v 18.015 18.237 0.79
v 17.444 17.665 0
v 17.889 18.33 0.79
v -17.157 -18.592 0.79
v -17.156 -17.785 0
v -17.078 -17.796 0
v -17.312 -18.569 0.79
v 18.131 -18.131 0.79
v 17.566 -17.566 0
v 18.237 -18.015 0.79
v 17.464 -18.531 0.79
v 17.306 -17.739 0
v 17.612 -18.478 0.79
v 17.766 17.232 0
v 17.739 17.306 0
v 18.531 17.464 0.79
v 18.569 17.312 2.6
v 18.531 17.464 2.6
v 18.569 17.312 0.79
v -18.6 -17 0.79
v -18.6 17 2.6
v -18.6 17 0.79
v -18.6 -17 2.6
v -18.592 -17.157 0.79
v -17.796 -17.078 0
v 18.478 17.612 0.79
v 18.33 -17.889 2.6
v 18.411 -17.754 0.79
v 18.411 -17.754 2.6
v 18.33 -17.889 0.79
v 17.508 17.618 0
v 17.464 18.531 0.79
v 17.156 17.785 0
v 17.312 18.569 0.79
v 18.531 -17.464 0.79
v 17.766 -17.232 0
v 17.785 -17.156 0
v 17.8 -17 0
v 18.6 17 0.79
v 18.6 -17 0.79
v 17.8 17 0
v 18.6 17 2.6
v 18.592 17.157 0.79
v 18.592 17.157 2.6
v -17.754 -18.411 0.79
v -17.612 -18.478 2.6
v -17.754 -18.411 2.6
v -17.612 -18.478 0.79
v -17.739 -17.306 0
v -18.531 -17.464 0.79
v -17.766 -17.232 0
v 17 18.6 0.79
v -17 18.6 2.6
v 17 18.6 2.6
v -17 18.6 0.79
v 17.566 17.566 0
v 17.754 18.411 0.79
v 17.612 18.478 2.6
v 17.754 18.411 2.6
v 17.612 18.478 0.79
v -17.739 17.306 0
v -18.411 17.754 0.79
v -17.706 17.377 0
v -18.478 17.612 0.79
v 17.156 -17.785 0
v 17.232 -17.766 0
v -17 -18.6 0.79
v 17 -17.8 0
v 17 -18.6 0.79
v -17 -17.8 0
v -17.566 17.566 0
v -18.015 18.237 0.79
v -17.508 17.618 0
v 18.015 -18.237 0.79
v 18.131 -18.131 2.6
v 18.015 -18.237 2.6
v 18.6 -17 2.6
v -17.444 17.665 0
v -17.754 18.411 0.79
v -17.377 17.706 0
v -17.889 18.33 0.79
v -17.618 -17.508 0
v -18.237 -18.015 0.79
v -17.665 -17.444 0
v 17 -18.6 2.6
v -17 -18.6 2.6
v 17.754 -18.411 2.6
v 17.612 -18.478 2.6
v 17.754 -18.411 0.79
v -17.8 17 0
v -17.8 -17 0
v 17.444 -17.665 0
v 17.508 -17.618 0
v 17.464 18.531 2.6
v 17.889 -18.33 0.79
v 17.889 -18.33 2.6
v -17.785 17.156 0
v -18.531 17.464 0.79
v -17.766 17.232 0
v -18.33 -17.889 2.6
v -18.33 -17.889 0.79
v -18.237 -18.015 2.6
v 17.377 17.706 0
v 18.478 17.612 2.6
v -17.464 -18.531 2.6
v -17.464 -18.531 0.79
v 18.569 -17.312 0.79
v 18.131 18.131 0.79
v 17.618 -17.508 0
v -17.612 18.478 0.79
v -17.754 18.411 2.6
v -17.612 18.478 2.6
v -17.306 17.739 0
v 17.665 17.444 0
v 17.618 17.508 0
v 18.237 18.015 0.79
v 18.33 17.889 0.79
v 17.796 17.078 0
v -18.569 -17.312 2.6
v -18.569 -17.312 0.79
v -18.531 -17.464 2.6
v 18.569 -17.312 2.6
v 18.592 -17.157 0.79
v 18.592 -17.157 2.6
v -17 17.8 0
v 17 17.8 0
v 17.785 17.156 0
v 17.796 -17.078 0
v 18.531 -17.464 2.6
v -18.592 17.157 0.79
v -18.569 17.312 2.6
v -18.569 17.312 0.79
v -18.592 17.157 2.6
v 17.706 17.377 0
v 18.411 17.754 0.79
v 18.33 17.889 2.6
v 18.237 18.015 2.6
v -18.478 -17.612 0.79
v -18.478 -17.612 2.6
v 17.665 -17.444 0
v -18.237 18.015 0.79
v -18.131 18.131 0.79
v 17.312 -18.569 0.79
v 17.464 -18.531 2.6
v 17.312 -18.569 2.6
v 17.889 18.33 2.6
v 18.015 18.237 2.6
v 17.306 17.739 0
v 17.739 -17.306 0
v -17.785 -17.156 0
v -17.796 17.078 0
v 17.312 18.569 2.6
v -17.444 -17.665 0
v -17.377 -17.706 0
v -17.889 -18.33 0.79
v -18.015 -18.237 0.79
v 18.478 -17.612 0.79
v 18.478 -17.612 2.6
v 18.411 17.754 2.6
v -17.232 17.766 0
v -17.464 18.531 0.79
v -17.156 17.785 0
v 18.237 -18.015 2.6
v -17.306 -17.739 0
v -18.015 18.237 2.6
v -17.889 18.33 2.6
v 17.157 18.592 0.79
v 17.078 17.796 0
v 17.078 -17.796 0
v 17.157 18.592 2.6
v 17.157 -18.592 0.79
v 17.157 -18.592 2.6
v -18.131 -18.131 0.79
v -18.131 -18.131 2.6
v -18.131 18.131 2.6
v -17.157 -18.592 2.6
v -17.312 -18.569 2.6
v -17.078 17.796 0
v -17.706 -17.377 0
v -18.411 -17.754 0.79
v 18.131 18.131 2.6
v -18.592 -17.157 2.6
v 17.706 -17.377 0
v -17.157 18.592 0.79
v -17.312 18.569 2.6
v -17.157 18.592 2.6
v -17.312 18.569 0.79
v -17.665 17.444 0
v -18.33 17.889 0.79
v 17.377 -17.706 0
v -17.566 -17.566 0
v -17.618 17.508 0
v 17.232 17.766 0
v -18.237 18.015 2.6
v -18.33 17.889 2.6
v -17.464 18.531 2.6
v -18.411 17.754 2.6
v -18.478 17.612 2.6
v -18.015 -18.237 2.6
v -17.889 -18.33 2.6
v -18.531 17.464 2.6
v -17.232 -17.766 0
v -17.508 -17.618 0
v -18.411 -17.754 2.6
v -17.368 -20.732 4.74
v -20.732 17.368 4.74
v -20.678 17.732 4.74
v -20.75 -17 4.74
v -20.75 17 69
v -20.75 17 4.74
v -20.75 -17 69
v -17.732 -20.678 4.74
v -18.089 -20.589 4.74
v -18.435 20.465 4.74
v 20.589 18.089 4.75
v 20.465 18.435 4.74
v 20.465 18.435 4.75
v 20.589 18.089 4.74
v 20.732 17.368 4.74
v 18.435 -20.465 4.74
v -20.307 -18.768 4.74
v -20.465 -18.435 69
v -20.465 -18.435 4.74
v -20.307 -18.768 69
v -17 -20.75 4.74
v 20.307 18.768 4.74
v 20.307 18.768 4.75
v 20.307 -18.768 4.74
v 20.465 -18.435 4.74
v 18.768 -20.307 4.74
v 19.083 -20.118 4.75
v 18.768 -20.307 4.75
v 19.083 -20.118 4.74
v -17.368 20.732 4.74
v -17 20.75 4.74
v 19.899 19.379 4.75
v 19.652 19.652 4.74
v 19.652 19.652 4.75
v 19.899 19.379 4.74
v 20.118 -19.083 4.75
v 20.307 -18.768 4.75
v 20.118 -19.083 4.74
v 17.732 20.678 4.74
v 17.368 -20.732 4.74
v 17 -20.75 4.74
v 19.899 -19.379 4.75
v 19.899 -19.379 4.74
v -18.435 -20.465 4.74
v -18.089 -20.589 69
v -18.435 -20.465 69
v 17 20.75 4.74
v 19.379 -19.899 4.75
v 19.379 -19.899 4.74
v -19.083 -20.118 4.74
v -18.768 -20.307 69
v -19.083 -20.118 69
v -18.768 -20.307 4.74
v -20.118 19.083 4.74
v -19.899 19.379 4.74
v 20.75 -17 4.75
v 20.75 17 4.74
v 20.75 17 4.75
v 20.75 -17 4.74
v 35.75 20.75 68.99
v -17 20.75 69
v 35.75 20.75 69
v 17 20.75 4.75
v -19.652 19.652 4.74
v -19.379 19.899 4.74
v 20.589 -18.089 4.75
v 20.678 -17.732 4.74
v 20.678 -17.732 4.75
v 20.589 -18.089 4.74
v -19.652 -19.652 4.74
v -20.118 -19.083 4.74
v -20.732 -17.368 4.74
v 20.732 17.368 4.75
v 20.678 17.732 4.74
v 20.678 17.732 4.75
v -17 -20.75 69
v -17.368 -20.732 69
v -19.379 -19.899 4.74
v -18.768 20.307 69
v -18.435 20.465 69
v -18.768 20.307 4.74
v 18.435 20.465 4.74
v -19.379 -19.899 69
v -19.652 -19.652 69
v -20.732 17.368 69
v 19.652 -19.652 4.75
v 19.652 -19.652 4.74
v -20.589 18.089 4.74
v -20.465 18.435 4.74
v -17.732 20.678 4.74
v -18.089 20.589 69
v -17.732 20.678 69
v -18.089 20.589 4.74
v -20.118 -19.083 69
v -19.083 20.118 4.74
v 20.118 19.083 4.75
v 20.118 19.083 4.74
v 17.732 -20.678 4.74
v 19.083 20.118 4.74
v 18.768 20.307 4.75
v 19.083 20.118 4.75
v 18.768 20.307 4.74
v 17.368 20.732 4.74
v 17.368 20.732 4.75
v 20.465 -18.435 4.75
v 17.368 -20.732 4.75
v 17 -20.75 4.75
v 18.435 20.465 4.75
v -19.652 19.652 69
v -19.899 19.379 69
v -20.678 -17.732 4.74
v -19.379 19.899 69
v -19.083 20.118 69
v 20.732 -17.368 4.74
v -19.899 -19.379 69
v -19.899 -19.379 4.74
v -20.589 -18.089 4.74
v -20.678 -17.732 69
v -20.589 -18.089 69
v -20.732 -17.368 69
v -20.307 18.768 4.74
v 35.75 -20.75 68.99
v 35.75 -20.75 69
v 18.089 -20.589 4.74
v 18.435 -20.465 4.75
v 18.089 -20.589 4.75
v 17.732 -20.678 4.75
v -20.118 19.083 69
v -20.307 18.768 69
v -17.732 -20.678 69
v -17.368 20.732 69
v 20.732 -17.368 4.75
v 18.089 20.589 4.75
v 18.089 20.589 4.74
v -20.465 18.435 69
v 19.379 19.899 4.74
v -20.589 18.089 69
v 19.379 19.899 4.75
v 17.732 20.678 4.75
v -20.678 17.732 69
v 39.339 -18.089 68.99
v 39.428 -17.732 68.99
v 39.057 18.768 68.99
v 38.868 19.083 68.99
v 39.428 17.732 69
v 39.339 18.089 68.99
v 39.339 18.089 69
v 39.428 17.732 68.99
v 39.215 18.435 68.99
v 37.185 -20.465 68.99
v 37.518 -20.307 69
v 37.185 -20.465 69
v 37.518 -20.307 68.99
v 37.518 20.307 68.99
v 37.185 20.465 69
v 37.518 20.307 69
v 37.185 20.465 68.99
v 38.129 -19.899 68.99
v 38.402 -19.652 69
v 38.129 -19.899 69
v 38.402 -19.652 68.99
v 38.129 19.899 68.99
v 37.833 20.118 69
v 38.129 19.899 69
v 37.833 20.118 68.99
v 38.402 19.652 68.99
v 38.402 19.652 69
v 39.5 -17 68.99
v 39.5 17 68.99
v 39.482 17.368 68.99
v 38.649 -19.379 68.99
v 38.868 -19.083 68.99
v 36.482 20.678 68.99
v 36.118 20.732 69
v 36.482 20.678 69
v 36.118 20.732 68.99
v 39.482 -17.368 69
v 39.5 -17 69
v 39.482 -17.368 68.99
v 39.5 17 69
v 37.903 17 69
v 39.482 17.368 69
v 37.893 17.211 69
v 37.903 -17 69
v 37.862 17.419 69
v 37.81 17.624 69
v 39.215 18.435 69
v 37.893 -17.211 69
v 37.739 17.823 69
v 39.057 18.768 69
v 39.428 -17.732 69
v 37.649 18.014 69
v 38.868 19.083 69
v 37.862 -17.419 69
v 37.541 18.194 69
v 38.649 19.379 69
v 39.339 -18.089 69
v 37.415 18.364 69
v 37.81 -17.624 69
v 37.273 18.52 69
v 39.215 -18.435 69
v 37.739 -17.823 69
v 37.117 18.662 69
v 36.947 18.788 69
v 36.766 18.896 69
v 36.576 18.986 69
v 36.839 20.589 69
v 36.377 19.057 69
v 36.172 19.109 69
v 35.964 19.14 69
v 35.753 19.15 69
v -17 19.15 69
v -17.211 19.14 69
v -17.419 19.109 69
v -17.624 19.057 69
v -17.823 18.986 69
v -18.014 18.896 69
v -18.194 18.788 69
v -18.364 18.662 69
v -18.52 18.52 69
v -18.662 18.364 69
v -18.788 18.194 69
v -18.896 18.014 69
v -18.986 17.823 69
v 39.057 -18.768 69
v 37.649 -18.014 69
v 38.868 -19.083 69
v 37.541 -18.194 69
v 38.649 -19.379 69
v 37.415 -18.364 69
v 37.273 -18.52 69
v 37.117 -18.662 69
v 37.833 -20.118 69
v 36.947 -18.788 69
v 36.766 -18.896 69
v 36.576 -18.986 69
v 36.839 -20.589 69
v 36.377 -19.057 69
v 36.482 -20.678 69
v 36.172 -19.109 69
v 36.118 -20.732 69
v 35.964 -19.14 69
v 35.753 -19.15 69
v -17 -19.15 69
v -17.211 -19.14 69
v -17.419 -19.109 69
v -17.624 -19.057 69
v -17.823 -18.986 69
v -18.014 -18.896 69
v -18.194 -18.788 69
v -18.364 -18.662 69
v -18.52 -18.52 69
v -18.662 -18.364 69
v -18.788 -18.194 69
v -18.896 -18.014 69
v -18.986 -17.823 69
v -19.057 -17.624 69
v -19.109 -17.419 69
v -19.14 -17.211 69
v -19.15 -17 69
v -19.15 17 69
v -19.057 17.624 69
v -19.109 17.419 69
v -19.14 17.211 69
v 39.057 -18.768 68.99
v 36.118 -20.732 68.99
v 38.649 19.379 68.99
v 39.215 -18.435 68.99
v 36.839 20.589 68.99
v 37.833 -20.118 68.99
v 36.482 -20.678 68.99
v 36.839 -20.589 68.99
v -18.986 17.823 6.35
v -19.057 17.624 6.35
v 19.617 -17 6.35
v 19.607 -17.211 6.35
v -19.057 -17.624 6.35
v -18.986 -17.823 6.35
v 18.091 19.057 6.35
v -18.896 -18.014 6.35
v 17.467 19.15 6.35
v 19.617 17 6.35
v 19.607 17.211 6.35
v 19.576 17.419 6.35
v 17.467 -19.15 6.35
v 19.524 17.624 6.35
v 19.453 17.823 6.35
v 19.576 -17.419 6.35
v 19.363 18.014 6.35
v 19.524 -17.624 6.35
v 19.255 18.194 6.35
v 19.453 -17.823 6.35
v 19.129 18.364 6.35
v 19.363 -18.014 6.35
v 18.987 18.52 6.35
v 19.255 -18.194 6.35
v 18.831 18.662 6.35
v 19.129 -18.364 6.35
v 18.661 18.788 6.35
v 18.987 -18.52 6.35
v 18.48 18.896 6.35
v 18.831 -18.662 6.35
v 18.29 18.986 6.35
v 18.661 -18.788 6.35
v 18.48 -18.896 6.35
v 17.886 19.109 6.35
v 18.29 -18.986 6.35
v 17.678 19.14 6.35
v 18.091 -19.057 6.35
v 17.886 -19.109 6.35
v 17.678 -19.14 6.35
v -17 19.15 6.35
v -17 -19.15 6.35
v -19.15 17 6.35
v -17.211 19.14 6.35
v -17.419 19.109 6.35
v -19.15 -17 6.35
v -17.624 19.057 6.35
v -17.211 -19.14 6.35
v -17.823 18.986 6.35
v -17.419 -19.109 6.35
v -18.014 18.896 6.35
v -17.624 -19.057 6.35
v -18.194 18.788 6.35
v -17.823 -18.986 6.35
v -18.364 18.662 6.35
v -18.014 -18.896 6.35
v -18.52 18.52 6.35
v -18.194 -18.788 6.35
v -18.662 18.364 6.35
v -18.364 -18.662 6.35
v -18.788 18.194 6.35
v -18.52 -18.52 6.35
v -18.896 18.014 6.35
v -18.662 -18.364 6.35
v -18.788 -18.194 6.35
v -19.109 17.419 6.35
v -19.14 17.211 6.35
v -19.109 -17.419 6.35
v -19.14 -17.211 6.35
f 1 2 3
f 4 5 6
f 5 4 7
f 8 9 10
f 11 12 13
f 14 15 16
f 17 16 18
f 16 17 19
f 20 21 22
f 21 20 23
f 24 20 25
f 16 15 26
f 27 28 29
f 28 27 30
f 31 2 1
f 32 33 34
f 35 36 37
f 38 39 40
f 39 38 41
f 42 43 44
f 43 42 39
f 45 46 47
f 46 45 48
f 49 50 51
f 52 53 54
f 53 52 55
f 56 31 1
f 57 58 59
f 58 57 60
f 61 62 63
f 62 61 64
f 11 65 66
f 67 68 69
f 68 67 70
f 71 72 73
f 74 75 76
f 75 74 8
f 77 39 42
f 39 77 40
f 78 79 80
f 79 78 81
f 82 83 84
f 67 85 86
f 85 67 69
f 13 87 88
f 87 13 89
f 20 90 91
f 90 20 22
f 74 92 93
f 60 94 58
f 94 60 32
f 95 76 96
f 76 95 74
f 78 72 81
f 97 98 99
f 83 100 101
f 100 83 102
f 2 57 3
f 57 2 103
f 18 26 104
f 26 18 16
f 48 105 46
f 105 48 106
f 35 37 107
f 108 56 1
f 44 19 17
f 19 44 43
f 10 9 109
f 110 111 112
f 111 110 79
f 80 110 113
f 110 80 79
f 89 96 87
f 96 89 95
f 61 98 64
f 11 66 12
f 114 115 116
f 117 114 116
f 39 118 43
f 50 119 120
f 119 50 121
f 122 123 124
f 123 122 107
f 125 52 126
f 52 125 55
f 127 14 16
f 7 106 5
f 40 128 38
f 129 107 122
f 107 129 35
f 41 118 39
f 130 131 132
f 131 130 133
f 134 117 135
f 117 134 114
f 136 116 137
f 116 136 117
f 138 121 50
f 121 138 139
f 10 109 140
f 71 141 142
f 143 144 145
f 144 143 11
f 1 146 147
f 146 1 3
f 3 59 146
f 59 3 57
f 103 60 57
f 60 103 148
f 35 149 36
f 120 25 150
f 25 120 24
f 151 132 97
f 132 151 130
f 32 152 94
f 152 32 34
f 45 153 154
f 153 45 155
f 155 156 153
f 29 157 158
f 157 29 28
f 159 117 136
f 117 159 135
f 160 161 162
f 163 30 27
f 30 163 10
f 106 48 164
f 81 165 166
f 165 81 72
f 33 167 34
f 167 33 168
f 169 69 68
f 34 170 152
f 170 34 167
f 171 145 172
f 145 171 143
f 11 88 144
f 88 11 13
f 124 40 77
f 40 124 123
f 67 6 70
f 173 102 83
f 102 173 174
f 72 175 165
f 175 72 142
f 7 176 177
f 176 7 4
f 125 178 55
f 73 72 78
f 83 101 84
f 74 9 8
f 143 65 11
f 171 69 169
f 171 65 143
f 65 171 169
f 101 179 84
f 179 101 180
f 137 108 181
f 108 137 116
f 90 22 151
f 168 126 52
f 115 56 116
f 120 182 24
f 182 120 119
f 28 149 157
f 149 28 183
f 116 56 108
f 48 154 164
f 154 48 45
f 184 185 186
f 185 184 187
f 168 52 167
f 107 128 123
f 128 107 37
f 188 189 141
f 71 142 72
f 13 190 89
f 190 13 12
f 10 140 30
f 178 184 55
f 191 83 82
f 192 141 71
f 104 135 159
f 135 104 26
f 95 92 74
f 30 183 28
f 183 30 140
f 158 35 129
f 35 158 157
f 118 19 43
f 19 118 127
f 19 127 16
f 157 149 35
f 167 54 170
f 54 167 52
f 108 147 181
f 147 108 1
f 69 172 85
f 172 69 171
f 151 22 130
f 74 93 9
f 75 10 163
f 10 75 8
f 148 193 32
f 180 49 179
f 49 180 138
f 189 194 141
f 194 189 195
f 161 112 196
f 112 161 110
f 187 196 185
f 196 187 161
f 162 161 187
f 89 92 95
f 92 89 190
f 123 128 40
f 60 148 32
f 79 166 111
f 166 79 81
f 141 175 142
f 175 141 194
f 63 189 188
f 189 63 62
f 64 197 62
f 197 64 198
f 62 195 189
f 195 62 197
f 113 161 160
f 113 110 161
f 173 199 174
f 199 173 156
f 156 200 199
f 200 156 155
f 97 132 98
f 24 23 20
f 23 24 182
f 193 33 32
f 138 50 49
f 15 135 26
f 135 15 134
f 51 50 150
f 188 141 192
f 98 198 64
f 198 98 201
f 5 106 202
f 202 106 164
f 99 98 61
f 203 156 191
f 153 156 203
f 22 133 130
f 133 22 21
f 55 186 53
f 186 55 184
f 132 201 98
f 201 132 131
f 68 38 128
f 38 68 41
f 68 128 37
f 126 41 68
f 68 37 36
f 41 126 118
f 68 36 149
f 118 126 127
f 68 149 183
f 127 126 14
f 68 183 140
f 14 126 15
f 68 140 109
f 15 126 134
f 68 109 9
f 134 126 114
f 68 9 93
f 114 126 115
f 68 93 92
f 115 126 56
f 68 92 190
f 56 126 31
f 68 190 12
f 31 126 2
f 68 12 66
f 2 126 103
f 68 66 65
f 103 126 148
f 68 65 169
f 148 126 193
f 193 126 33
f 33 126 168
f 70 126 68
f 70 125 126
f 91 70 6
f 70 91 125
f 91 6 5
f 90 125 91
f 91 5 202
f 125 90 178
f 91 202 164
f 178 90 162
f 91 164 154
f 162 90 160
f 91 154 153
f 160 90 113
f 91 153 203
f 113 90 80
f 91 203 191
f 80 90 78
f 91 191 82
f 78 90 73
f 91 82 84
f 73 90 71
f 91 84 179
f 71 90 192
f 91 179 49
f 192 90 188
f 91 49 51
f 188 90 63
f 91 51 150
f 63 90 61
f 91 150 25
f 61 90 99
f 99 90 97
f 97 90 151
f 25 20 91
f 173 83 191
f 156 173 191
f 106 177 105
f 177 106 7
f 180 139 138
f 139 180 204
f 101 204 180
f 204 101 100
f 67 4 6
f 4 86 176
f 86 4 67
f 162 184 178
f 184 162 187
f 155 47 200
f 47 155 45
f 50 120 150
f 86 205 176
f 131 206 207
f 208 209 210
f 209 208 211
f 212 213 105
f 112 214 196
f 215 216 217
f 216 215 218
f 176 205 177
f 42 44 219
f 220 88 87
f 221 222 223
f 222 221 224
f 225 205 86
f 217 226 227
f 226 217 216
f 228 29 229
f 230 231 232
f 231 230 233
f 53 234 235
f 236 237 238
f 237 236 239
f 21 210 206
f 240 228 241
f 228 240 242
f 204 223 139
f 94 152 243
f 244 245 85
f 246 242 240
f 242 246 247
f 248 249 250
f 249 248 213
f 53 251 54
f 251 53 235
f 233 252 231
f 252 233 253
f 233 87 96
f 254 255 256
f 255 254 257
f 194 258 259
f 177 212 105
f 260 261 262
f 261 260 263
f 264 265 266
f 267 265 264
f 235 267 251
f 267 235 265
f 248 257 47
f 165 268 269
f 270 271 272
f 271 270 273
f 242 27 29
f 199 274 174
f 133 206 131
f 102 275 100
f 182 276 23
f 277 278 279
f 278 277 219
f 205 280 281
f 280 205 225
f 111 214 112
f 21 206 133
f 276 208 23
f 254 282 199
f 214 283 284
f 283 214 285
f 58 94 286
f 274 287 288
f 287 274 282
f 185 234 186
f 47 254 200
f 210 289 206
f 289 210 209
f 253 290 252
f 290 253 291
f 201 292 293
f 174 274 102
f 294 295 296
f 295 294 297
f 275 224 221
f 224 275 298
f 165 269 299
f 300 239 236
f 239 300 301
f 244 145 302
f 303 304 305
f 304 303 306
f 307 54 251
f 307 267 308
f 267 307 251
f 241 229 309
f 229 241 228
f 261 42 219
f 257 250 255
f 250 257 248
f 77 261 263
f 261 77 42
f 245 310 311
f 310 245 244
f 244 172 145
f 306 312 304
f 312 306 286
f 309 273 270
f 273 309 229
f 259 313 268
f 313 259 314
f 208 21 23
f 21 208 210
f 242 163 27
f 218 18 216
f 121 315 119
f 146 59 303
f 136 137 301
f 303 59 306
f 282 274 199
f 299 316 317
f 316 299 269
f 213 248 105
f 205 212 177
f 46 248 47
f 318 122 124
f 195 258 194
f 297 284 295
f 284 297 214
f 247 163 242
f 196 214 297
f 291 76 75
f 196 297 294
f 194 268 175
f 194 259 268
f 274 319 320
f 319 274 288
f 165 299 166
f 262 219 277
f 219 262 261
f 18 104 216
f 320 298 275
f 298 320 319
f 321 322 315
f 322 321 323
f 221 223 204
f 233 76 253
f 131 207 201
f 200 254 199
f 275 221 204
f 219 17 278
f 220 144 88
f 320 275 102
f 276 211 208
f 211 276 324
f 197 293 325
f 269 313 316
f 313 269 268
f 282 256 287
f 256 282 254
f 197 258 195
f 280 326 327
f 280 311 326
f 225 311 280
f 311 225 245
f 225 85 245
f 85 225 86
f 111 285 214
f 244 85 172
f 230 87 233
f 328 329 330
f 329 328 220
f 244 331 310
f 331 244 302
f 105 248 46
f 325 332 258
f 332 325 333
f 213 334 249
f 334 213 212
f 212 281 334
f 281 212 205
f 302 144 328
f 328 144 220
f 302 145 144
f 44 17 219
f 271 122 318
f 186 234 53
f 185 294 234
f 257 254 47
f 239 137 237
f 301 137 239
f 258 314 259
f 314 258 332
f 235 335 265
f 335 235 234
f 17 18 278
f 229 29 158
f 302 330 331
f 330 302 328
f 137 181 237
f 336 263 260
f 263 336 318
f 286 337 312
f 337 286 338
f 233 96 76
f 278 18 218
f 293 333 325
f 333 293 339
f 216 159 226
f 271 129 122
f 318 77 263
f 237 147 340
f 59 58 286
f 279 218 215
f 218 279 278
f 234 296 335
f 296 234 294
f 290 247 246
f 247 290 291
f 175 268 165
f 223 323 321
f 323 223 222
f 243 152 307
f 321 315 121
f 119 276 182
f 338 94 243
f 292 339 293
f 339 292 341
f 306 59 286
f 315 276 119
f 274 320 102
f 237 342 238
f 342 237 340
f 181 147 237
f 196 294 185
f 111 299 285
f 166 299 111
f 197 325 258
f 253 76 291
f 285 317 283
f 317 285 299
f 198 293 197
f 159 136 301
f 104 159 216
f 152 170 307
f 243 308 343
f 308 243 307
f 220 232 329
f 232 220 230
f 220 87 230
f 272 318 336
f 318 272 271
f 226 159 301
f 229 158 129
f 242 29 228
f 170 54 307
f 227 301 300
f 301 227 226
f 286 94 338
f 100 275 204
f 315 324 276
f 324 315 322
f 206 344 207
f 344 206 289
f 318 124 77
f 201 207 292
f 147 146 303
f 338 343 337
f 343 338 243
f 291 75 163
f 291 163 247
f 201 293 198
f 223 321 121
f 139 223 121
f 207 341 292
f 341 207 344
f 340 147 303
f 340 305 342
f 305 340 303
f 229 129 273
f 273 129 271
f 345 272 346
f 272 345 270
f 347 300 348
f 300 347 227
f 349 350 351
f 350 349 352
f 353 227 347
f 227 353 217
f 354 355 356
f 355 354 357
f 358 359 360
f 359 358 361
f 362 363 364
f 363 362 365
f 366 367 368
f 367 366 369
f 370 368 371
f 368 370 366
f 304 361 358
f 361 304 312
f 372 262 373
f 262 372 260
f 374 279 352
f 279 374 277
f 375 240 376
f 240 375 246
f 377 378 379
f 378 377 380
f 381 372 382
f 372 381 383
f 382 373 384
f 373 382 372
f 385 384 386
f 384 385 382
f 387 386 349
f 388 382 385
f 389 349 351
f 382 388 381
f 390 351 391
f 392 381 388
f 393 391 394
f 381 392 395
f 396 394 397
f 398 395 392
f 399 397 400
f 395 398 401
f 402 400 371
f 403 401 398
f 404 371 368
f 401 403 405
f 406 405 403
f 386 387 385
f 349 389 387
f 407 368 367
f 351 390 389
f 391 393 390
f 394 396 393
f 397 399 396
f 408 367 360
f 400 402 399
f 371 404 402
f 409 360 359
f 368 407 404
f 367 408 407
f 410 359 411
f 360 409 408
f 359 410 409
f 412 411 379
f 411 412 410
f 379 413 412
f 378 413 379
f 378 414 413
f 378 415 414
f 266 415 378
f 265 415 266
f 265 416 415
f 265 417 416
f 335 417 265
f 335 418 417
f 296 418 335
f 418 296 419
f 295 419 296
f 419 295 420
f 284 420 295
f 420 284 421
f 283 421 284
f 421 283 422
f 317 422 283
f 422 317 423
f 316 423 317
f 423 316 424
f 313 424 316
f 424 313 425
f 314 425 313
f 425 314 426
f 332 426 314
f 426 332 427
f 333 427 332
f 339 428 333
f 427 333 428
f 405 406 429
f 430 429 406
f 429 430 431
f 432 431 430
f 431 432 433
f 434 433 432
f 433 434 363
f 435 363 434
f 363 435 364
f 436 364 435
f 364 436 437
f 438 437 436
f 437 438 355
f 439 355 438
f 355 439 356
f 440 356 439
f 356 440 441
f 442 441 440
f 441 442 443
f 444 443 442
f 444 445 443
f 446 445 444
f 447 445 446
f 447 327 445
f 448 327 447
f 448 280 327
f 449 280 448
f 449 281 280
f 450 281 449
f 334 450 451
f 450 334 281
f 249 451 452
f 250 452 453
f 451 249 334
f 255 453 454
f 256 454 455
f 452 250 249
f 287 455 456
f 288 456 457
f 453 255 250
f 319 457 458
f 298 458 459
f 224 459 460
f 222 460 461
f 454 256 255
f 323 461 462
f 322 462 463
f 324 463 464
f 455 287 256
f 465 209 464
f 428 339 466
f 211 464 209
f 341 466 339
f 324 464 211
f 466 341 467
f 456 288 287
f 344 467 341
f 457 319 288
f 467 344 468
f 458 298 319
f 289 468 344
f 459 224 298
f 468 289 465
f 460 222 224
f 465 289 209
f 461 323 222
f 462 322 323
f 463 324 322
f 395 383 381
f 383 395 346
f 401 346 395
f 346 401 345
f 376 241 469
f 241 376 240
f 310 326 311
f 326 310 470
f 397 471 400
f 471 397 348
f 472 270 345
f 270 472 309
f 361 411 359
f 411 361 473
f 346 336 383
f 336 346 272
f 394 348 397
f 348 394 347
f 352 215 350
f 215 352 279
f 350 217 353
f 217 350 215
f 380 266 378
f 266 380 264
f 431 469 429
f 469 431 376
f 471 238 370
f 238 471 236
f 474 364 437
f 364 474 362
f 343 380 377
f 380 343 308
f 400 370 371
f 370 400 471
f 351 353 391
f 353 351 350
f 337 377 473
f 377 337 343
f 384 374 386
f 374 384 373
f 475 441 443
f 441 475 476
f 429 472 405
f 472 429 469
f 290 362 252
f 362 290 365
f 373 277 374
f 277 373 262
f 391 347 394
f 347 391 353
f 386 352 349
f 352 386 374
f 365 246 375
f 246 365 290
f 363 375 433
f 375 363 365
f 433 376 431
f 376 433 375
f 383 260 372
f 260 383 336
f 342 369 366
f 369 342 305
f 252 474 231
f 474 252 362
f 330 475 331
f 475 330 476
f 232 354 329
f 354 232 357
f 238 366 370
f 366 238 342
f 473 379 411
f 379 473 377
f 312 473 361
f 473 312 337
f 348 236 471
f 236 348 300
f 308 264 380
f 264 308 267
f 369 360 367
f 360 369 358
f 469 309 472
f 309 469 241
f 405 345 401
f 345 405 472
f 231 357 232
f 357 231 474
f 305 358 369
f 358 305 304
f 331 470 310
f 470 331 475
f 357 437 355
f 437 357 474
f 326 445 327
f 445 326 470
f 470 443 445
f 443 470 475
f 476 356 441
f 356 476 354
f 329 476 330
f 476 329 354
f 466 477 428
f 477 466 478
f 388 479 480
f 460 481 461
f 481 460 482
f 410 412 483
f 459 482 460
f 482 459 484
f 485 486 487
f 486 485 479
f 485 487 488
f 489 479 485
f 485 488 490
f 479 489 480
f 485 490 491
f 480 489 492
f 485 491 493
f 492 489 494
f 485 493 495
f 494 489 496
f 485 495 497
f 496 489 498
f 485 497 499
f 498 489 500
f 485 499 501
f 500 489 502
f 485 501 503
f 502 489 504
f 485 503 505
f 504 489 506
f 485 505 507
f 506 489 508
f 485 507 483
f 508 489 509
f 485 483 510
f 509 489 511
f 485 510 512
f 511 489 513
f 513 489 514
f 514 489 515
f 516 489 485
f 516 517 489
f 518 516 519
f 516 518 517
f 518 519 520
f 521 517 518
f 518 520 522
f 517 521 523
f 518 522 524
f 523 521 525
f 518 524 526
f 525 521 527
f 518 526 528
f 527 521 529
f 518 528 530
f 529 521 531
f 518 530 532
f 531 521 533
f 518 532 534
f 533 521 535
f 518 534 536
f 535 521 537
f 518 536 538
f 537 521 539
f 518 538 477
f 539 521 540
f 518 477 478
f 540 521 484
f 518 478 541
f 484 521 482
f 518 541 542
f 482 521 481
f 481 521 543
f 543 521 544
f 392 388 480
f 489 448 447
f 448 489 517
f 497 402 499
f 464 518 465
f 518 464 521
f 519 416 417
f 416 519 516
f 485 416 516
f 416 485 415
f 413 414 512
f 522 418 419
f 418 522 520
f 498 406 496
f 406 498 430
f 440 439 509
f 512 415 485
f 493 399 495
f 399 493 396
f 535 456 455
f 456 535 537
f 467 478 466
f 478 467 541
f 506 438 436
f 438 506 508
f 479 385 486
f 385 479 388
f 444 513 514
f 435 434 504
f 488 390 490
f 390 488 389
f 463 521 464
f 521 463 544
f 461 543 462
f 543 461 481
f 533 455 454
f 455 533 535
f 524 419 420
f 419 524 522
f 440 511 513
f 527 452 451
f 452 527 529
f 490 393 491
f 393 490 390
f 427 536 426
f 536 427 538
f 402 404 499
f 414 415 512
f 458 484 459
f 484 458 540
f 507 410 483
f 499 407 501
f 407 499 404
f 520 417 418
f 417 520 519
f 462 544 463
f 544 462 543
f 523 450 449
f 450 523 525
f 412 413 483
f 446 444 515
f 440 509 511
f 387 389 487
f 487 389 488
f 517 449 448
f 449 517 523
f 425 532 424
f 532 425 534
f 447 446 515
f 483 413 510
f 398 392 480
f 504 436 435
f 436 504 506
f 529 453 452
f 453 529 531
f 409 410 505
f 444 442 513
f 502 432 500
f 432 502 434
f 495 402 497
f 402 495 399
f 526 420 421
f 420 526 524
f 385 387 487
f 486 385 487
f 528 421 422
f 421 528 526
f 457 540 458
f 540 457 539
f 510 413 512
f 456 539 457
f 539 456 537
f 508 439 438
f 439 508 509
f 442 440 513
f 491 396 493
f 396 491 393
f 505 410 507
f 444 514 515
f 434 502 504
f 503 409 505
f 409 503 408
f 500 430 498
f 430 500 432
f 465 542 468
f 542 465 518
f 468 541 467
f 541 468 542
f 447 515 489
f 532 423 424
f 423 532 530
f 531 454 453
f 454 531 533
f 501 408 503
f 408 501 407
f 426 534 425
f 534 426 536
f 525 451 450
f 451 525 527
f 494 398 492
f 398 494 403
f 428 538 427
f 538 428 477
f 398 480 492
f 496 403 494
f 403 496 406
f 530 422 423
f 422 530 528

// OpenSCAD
// Drawer Organiser — single-cell front container of the full-drawer layout (1 x 1 cell)
// Render this file to generate drawer_container_front_1x1.stl
// 42 x 42 x 69mm assembled — 41.5 x 41.5mm at the floor, ~60.25mm wide at the
// rim where the flared wall leans out. Comfortably inside an A1's 250mm bed, so
// the whole file is the printable part. A single cell cannot be split at all,
// so unlike the other containers this file exposes no split_parts/part_index
// and calls container() directly.
//
// Fills the last cell of the drawer's last column, behind
// drawer_container_front_1x3 (issue #324). Stands against the right wall, so
// its +X wall leans outward with height to follow the drawer (see side_flare()
// in _drawer_organiser.scad).
// No rotate(): sources stay OpenSCAD Z-up; the viewer applies the Z-up -> Y-up conversion itself.

include <_drawer_organiser.scad>

grid_x  = 1;          // cells across (X)
grid_y  = 1;          // cells deep (Y)
height  = 69;         // overall height above the drawer floor (mm); the drawer is 69mm tall
wall_t  = 1.6;        // wall thickness (mm)
floor_t = 1.6;        // floor thickness above the base pads (mm)

container(grid_x, grid_y, height, wall_t, floor_t,
          fpx = side_flare(height));
